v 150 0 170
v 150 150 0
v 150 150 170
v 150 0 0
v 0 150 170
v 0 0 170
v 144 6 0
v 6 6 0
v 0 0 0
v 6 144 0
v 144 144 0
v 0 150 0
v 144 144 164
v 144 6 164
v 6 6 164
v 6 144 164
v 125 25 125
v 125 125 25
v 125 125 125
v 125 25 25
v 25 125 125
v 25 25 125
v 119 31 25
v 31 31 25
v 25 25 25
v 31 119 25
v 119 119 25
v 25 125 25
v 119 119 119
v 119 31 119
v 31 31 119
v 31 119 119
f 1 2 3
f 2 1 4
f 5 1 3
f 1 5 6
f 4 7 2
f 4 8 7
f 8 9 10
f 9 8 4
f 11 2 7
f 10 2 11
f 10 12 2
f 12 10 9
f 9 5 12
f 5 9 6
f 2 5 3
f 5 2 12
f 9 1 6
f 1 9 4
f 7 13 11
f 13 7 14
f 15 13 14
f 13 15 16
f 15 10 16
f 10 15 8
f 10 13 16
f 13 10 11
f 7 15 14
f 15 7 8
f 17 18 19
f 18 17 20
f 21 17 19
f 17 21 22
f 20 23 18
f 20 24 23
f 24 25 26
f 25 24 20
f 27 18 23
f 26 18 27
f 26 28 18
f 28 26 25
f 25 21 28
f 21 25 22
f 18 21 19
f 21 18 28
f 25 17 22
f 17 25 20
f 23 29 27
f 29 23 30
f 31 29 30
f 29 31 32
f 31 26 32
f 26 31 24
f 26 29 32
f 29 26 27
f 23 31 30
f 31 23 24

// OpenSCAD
insulation_thickness = 50;
cover_width = 100;
cover_depth = 100;
cover_height = 120;
wall_thickness = 6;
slide_overlap_height = 25;
slide_overlap_thickness = wall_thickness / 2;


module cover_outershell () {
    translate([0, 0, 0]) { 
        difference() {
            outershell_width = cover_width + insulation_thickness;
            outershell_depth = cover_depth + insulation_thickness;
            outershell_height = cover_height + insulation_thickness;
            cube([outershell_width, outershell_depth, outershell_height]);
            
            // subtract the inner part to create hollow space and walls
            translate([wall_thickness, wall_thickness, 0]) {
                cube([outershell_width - 2 * wall_thickness, outershell_depth - 2 * wall_thickness, outershell_height - wall_thickness]);
                
            // subctract slide overlap
            }            
        }
    }
}


module cover_innershell () {
    translate([insulation_thickness / 2, insulation_thickness / 2, insulation_thickness / 2]) { 
        difference() {
            cube([cover_width, cover_depth, cover_depth]);
            
            // subtract the inner part to create hollow space and walls
            translate([wall_thickness, wall_thickness, 0]) {
                cube([cover_width - 2 * wall_thickness, cover_depth - 2 * wall_thickness, cover_depth - wall_thickness]);
            }            
        }
    }
}

module bottom_outerplatoform () {
    translate([0, 0, 0]) {
        difference() {
            outerplatform_width = cover_width + insulation_thickness;
            outerplatform_depth = cover_depth + insulation_thickness;
            outerplatform_height = slide_overlap_height * 2 + wall_thickness;
            cube([outerplatform_width, outerplatform_depth, outerplatform_height]);
            
            translate([wall_thickness, wall_thickness, wall_thickness]) {
                cube([outerplatform_width - 2 * wall_thickness, outerplatform_depth - 2 * wall_thickness, outerplatform_height]);
            }
            
            translate([wall_thickness - slide_overlap_thickness, wall_thickness - slide_overlap_thickness, outerplatform_height - slide_overlap_height - wall_thickness]) {
                cube([outerplatform_width - 2 * slide_overlap_thickness, outerplatform_depth - 2 * slide_overlap_thickness, slide_overlap_height + wall_thickness]);
            }
 
        }
        
        // subtract the inner part to create hollow space and walls
    }
}

module bottom_innerplatform () {
    translate([slide_overlap_thickness, slide_overlap_thickness, slide_overlap_height]) {
        outerplatform_width = cover_width + insulation_thickness;
        outerplatform_depth = cover_depth + insulation_thickness;
        outerplatform_height = slide_overlap_height * 2 + wall_thickness;
        difference() {
            cube([outerplatform_width - wallthickness, outerplatform_height - wallthickness, wallthickness]);
        } 
    }
}

cover_outershell ();
cover_innershell ();
// bottom_outerplatoform();
